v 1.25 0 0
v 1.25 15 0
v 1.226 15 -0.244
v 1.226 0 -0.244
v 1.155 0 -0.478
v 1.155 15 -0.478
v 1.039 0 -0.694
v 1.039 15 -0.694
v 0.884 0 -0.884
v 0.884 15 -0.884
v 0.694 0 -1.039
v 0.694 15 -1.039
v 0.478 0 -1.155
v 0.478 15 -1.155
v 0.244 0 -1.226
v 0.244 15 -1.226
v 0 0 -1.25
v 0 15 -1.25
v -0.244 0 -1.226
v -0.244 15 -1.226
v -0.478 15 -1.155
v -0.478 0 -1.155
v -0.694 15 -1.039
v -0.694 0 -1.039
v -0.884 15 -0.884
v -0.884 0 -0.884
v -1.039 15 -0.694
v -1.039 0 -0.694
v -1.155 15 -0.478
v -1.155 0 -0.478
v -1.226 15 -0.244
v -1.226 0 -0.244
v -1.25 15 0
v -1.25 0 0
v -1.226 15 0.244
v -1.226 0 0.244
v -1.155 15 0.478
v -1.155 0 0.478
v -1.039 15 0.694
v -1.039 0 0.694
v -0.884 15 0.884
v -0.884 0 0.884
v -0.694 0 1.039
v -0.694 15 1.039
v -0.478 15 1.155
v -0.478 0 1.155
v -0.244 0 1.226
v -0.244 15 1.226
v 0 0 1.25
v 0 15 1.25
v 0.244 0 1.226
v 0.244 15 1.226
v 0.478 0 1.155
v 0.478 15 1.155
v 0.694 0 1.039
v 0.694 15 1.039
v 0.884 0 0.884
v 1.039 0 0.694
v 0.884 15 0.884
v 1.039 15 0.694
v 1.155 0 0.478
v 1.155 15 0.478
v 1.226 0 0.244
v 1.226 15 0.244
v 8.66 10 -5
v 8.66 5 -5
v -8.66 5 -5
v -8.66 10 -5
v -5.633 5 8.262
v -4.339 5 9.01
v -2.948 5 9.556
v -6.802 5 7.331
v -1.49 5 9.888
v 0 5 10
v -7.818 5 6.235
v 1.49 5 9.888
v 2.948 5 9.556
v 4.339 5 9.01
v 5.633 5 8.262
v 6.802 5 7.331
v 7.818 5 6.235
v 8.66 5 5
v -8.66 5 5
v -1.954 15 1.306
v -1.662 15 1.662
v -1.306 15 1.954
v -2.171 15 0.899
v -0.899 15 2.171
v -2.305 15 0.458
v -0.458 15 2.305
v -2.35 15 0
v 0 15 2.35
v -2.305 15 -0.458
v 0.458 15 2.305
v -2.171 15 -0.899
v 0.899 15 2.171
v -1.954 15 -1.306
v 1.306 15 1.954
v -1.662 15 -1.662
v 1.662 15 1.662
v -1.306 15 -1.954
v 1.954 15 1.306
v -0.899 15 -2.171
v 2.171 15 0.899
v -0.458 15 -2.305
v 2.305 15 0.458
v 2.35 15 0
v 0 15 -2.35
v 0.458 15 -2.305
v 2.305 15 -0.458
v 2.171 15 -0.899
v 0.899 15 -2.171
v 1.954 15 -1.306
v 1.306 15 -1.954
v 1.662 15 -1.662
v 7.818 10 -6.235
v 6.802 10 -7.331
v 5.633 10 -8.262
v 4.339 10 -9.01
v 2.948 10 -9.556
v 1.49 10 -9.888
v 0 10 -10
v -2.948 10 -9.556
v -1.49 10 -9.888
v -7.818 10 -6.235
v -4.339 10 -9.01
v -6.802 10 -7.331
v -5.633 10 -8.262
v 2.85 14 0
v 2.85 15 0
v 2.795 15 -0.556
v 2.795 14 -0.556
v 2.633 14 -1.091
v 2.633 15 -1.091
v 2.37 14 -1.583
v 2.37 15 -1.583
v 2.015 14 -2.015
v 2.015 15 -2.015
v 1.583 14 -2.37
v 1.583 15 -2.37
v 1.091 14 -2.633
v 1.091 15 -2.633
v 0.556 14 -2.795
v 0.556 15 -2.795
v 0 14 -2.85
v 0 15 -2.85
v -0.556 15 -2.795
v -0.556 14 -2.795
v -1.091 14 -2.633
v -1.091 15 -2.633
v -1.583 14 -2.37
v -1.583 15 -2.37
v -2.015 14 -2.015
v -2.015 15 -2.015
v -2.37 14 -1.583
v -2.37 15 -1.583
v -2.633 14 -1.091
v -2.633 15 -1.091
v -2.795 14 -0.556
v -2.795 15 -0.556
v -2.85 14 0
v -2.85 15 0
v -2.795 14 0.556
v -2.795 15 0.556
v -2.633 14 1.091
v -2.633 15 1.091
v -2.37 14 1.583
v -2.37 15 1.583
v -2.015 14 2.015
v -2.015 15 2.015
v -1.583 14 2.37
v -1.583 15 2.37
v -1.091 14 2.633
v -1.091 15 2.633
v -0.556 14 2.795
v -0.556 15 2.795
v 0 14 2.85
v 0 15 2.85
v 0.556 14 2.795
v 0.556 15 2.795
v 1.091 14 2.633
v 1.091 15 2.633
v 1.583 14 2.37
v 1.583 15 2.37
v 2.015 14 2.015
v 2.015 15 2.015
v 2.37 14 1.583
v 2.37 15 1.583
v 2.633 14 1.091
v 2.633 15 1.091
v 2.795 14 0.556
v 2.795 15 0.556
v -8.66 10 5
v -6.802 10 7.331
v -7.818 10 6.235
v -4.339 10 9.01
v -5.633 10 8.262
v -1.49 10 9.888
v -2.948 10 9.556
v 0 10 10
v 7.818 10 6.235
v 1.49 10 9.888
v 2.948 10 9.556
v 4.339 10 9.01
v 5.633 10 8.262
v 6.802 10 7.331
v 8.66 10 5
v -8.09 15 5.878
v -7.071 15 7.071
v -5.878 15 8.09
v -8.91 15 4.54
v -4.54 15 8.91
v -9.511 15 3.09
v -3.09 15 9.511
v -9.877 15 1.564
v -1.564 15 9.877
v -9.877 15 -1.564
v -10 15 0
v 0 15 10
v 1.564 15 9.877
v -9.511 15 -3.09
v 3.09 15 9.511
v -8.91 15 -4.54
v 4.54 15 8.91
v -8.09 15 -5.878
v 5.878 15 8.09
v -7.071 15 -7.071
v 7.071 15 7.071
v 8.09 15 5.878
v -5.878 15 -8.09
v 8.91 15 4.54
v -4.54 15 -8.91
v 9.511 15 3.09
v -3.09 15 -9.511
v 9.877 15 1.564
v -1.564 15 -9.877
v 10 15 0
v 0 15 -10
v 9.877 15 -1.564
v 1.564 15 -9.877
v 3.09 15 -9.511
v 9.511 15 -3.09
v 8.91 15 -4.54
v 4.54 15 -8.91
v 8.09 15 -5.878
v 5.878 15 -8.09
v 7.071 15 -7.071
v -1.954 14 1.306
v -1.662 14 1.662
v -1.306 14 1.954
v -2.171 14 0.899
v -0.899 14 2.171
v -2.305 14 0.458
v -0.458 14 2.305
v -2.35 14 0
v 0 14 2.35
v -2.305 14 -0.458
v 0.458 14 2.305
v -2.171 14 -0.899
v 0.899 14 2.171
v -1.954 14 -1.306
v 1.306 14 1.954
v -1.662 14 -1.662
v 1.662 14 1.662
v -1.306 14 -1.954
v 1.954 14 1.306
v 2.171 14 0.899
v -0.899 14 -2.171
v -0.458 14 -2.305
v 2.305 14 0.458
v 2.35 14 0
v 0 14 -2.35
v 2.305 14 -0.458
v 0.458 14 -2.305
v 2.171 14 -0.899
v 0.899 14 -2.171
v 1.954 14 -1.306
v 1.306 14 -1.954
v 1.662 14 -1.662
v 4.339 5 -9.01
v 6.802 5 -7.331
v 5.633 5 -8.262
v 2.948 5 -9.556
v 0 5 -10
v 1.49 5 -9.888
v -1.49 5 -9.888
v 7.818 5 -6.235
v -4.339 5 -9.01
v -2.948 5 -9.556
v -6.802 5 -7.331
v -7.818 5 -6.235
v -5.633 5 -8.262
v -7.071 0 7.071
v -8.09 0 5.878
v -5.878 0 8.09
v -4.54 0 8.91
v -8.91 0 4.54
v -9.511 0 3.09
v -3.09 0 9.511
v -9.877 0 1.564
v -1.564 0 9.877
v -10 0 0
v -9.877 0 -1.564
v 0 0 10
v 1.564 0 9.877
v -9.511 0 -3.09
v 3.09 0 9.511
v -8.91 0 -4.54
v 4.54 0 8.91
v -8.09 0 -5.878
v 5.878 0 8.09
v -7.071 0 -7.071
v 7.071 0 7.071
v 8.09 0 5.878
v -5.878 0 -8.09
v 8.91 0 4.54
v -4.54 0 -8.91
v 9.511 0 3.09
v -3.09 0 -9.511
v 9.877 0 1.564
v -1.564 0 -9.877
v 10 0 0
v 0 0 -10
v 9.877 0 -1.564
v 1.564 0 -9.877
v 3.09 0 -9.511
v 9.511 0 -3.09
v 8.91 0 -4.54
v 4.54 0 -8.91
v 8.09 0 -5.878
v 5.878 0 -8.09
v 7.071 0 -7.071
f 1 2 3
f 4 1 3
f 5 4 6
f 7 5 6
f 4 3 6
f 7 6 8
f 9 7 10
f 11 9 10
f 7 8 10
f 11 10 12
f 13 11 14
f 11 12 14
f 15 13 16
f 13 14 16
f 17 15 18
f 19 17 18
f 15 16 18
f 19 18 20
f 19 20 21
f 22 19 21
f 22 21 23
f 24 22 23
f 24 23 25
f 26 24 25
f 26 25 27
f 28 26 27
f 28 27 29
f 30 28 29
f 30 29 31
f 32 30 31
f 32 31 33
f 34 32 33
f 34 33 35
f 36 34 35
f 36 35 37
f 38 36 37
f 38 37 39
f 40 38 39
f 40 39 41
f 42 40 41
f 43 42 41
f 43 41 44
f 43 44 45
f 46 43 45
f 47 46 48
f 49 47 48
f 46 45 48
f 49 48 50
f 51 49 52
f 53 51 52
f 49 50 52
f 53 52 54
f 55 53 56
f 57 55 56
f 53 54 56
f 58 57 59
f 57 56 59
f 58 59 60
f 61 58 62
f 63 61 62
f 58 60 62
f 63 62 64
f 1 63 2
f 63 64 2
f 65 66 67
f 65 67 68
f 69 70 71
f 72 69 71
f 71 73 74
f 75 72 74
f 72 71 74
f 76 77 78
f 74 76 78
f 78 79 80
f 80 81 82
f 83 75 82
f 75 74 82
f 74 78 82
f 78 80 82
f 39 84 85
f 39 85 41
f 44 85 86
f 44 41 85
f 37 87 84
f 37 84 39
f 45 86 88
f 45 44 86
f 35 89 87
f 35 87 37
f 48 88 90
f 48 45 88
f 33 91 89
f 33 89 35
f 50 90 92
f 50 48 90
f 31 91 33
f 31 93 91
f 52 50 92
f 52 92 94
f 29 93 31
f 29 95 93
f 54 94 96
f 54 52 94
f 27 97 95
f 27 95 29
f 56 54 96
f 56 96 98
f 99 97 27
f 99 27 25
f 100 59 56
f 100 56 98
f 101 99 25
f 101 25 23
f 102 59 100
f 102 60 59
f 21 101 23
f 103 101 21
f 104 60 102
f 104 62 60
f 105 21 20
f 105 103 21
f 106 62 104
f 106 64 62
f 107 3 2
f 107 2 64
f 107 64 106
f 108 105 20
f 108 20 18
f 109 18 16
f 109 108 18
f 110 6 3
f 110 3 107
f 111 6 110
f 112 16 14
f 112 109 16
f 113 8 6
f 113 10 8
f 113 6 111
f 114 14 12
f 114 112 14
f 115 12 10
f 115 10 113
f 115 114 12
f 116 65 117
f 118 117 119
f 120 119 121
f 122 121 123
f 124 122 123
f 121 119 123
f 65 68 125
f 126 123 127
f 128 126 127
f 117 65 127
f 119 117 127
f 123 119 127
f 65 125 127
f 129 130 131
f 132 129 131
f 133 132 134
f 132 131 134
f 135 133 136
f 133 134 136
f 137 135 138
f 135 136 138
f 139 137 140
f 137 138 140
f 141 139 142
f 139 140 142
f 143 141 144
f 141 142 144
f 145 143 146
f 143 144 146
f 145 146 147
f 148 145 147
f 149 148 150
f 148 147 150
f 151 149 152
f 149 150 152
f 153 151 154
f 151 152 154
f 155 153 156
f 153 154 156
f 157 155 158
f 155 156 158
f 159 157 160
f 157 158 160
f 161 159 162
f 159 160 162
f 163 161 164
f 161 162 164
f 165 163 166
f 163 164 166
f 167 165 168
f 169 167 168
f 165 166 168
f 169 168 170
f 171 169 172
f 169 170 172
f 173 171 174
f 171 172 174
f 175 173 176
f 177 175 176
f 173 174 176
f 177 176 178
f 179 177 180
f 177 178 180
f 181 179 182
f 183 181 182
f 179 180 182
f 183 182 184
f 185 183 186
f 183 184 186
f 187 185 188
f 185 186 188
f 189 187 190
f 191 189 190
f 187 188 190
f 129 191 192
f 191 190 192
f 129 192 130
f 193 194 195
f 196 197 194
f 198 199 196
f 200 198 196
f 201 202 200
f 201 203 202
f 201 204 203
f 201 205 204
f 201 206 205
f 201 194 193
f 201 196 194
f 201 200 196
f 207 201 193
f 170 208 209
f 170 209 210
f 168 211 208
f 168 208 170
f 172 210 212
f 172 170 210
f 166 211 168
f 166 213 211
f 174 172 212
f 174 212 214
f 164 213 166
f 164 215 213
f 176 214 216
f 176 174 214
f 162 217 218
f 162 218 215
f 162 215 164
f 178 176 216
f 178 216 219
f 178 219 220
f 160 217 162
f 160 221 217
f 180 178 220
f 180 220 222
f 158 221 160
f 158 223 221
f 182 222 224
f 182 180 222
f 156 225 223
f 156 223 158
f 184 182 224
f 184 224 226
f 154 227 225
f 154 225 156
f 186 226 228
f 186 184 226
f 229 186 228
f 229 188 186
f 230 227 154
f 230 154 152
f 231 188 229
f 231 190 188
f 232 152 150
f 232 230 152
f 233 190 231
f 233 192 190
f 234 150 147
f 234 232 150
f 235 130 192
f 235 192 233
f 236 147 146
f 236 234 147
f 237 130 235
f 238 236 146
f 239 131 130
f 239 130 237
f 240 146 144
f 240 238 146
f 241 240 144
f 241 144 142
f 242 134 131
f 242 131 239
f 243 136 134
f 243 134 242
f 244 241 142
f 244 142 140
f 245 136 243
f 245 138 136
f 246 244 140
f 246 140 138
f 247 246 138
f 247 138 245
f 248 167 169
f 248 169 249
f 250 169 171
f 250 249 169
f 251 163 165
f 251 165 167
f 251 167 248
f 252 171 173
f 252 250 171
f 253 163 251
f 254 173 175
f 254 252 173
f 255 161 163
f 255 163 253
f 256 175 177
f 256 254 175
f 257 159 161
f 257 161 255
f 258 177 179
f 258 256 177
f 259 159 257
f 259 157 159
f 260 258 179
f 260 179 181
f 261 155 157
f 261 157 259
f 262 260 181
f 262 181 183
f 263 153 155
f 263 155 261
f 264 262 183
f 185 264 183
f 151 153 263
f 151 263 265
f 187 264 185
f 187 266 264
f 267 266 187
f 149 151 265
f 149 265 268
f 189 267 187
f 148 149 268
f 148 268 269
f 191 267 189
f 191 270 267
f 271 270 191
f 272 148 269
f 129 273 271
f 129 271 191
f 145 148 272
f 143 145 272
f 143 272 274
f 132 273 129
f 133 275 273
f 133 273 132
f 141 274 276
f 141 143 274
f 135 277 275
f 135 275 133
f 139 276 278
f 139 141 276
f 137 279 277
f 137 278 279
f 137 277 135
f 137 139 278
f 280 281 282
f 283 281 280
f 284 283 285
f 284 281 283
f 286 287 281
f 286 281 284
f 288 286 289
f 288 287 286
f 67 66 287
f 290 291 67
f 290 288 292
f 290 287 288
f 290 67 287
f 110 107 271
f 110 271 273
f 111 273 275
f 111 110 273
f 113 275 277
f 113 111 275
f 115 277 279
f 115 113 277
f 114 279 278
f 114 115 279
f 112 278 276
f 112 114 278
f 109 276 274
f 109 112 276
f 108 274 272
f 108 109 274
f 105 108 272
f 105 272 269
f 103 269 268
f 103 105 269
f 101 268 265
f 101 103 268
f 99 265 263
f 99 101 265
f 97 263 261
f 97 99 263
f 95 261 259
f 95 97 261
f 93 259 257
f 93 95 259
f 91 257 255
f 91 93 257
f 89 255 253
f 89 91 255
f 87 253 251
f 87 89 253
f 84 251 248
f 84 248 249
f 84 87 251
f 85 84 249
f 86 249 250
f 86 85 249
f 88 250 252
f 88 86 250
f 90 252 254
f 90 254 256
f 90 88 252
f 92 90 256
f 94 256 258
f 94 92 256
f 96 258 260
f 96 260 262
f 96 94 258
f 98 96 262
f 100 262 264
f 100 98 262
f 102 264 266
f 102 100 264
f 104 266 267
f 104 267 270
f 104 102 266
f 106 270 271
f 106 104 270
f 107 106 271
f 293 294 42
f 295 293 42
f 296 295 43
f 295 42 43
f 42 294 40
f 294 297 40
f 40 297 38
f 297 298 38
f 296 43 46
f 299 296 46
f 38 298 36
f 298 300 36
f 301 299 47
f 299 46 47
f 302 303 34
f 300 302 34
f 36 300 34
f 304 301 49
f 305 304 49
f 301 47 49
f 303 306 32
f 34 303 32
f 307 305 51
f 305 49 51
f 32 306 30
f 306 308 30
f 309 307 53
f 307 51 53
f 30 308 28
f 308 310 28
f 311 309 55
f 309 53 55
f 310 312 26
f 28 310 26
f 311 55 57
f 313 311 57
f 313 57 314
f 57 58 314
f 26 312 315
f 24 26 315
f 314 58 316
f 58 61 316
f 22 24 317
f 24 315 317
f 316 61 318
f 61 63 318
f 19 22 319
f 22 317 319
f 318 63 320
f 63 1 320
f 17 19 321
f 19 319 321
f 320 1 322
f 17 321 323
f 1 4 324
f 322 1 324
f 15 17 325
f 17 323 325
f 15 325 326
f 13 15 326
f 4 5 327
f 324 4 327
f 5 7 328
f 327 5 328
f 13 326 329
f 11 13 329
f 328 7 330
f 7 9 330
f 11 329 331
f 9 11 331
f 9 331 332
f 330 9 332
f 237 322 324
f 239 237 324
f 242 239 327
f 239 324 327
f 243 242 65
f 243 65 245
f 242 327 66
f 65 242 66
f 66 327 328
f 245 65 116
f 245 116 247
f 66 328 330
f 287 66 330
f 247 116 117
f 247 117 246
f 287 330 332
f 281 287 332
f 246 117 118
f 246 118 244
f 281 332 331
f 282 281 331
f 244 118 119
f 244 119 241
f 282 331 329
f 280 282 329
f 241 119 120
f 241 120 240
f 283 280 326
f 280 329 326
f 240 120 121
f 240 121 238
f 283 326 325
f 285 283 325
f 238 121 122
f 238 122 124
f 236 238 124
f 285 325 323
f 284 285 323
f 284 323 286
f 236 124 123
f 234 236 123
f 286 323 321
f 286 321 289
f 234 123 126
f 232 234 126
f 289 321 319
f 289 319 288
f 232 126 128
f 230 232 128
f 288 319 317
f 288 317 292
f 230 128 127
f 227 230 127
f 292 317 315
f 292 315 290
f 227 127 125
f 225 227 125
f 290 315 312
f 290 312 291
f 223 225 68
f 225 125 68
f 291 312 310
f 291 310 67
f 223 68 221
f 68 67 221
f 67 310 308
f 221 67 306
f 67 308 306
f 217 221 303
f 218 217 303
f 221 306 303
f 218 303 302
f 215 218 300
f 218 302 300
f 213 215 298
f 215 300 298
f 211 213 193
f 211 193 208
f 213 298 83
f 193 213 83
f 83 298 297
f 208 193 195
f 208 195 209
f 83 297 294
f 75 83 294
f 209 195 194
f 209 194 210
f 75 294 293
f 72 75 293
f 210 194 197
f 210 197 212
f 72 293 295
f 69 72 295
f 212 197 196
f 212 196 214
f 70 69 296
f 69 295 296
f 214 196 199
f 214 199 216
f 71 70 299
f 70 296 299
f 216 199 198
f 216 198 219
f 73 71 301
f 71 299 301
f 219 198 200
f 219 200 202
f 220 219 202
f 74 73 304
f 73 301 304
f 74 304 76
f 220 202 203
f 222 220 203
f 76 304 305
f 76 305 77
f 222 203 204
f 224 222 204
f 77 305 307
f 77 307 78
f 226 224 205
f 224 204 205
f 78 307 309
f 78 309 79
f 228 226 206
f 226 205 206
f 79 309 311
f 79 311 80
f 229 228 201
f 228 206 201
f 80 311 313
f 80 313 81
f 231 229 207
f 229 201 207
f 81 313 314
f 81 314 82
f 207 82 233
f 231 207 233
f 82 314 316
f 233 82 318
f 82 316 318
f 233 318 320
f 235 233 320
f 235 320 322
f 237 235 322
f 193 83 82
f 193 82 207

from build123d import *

# Parameters (mm, degrees)
ESQUISSE1_R                  = 10
BOSS_EXTRU_1_DEPTH           = 15
ESQUISSE2_R                  = 2.85
ESQUISSE2_R_2                = 2.35
ENL_V_MAT_EXTRU_1_DEPTH      = 1
ESQUISSE3_R                  = 1.25
ENL_V_MAT_EXTRU_2_DEPTH      = 16
ESQUISSE4_W                  = 5
ESQUISSE4_H                  = 5
ENL_V_MAT_EXTRU_3_DEPTH      = 11
ENL_V_MAT_EXTRU_3_DEPTH_BACK = 11


with BuildPart() as part:
    # Esquisse1 → Boss.-Extru.1 (new body)
    with BuildSketch(Plane(origin=(0, 0, 0), x_dir=(1, 0, 0), z_dir=(0, 1, 0))):
        Circle(ESQUISSE1_R)
    extrude(amount=BOSS_EXTRU_1_DEPTH)

    # Esquisse2 → Enlèv. mat.-Extru.1 (cut)
    with BuildSketch(Plane(origin=(0, 15, 0), x_dir=(1, 0, 0), z_dir=(0, 1, 0))):
        Circle(ESQUISSE2_R)
        Circle(ESQUISSE2_R_2, mode=Mode.SUBTRACT)
    extrude(amount=-ENL_V_MAT_EXTRU_1_DEPTH, mode=Mode.SUBTRACT)

    # Esquisse3 → Enlèv. mat.-Extru.2 (cut, through all)
    with BuildSketch(Plane(origin=(0, 15, 0), x_dir=(1, 0, 0), z_dir=(0, 1, 0))):
        Circle(ESQUISSE3_R)
    extrude(amount=-ENL_V_MAT_EXTRU_2_DEPTH, mode=Mode.SUBTRACT)

    # Esquisse4 → Enlèv. mat.-Extru.3 (cut, two sides)
    with BuildSketch(Plane(origin=(0, 0, 0), x_dir=(0, 0, -1), z_dir=(1, 0, 0))) as enl_v_mat_extru_3_sk:
        with Locations((-7.5, 7.5)):
            Rectangle(ESQUISSE4_W, ESQUISSE4_H)
        with Locations((7.5, 7.5)):
            Rectangle(ESQUISSE4_W, ESQUISSE4_H)
    extrude(amount=ENL_V_MAT_EXTRU_3_DEPTH, mode=Mode.SUBTRACT)
    extrude(enl_v_mat_extru_3_sk.sketch, amount=-ENL_V_MAT_EXTRU_3_DEPTH_BACK, mode=Mode.SUBTRACT)


solid = part.part
